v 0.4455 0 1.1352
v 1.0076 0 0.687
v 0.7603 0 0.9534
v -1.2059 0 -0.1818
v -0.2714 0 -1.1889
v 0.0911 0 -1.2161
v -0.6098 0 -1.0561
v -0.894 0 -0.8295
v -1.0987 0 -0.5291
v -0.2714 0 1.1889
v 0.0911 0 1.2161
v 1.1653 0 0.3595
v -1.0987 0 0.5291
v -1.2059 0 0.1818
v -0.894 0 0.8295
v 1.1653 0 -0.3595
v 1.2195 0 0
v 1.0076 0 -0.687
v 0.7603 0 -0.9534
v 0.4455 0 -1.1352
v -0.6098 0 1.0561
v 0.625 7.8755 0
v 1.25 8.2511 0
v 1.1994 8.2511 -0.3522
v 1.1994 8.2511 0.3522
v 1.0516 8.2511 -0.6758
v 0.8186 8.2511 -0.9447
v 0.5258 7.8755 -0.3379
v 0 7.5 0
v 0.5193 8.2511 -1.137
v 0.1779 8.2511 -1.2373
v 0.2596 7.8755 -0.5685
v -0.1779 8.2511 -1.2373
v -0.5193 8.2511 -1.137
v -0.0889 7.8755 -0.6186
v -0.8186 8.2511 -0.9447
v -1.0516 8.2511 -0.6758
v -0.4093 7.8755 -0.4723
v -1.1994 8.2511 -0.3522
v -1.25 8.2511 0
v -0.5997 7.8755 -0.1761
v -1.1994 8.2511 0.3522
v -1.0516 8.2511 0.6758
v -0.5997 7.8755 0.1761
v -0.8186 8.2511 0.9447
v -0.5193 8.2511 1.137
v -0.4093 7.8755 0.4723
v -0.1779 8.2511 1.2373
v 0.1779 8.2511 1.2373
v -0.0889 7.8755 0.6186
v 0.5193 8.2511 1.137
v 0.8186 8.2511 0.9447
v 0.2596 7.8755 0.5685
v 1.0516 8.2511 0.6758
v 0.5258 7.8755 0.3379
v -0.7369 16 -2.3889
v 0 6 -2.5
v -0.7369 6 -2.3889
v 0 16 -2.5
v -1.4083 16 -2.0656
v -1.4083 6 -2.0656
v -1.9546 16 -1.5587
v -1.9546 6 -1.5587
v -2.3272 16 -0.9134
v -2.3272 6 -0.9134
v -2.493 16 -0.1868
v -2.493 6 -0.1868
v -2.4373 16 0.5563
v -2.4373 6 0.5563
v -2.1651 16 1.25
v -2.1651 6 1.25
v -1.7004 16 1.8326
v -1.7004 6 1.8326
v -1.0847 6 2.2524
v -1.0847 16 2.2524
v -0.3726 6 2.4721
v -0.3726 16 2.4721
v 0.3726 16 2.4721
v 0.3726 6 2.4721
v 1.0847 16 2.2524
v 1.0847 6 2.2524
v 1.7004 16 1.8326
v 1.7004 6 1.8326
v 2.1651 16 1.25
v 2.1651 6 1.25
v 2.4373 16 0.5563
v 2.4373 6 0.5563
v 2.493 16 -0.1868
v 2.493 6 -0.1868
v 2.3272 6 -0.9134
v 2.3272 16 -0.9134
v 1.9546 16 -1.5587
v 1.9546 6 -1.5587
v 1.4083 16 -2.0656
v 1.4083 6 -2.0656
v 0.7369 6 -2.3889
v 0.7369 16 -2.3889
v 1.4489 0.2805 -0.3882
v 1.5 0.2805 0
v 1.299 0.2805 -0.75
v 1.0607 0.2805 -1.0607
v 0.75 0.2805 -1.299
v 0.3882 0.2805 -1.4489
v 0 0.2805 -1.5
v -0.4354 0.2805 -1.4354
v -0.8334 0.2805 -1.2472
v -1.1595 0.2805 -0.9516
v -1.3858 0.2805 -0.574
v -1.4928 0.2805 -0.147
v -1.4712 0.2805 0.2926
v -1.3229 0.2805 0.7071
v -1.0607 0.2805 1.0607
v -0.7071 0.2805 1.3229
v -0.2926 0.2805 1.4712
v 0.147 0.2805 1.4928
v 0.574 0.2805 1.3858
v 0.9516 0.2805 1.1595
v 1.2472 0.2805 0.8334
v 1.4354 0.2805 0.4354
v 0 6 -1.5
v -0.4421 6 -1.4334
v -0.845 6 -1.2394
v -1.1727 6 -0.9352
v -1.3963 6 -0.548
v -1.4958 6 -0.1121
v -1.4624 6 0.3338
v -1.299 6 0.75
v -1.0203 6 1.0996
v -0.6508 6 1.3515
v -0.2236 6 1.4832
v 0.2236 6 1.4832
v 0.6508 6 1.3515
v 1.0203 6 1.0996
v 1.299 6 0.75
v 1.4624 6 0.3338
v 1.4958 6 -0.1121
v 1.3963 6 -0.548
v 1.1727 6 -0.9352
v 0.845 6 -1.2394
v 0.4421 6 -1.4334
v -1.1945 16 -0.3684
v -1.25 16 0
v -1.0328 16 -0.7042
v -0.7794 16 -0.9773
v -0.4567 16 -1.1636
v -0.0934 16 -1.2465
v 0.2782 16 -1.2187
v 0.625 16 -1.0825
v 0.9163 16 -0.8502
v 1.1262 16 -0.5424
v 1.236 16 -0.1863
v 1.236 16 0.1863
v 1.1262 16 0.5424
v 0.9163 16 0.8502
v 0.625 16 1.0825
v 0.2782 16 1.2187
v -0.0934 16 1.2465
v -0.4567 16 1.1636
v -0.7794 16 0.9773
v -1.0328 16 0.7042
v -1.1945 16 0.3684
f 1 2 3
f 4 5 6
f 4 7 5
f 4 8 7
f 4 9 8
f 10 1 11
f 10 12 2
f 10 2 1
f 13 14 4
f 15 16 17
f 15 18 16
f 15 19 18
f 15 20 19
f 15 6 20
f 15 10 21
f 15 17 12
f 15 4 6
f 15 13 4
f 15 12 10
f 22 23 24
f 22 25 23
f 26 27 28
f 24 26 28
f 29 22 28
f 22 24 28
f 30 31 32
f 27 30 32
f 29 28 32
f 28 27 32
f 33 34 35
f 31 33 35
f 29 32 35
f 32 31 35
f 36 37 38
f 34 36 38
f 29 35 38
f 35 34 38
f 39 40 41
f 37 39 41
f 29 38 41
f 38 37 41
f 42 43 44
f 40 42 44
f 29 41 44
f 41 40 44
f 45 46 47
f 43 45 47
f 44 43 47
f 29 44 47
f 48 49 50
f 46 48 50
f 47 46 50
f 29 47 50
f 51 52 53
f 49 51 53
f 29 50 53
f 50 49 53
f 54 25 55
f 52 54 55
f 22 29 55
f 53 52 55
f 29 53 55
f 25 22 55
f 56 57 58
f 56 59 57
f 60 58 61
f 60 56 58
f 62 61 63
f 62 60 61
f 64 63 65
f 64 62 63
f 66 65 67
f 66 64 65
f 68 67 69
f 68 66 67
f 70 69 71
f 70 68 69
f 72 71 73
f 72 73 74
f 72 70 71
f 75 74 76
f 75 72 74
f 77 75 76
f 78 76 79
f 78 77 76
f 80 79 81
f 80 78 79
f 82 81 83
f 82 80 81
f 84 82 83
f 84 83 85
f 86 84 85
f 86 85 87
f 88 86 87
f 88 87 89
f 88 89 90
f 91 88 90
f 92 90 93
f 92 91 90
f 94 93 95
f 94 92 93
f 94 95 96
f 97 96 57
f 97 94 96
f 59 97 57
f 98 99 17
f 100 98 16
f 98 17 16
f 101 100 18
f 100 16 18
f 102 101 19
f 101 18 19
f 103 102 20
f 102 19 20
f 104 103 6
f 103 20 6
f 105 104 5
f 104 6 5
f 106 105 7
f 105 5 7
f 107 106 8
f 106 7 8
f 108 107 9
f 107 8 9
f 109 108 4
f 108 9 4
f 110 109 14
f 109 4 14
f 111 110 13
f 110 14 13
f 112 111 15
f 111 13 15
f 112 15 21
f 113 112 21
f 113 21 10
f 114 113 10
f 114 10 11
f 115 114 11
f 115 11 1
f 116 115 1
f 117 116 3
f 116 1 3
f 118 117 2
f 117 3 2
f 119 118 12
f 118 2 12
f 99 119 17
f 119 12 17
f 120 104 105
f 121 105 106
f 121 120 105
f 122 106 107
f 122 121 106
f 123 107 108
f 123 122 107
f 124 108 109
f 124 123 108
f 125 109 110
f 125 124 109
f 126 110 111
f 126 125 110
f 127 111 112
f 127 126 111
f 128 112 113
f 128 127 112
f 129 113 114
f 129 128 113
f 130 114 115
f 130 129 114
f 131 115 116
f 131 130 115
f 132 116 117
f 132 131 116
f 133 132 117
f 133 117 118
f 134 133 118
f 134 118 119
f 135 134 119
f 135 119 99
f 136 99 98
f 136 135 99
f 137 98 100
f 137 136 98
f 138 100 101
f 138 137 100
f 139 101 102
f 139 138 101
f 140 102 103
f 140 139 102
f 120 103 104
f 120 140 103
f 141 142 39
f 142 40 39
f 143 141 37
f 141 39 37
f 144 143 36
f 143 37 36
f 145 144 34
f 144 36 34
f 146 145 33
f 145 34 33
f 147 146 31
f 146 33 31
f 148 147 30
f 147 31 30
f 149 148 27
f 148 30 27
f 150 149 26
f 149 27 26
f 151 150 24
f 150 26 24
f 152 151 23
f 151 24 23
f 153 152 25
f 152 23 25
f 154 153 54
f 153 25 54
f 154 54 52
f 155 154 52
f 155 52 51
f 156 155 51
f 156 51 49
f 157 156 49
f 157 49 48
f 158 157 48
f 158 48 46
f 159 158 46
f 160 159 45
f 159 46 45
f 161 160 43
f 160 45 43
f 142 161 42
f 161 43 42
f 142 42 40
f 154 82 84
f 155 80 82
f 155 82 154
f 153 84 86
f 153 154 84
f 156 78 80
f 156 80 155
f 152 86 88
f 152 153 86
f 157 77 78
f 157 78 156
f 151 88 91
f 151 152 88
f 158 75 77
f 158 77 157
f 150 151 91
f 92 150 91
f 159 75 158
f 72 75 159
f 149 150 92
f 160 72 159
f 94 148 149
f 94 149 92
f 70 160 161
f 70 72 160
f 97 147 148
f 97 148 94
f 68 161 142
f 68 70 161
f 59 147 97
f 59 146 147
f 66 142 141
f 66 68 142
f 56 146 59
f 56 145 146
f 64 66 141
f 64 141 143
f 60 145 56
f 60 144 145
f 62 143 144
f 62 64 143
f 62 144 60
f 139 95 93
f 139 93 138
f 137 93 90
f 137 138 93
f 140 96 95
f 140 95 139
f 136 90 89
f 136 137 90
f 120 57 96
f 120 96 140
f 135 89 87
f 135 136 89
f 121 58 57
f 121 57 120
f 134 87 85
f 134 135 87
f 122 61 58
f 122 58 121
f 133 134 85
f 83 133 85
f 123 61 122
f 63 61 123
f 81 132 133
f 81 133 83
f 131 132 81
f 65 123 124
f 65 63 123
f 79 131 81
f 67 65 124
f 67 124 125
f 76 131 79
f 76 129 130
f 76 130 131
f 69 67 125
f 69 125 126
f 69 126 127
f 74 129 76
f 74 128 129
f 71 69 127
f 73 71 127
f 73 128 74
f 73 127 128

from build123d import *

# Parameters (mm, degrees)
M3_TAPPED_HOLE1_D     = 2.5
M3_TAPPED_HOLE1_DEPTH = 7.748924226
M3_TAPPED_HOLE1_TIP   = 0.751075774


# Read off the part's stored shape, not the designer's step: M3 Machine Threads Stud1
with BuildPart() as part:
    # Sketch2 → Revolve1 (revolve)
    with BuildSketch(Plane.XY, mode=Mode.PRIVATE) as revolve1_sk:
        Polygon((0, 0), (1.5, 0), (1.5, 6), (2.5, 6), (2.5, 16), (0, 16), align=None)
    revolve(revolve1_sk.sketch.rotate(Axis((0, 0, 0), (0, 1, 0)), 90), axis=Axis((0, 0, 0), (0, 1, 0)))

    # M3 Machine Threads Stud1 outline → M3 Machine Threads Stud1 (revolve, cut)
    with BuildSketch(Plane.XY):
        Polygon((1.5, 0.2805), (1.2195, 0), (1.5, 0), align=None)
    revolve(axis=Axis((0, 0, 0), (0, 1, 0)), mode=Mode.SUBTRACT)

    # M3 Tapped Hole1
    with Locations(Plane(origin=(0, 16, 0), x_dir=(1, 0, 0), z_dir=(0, 1, 0))):
        with Locations((0, 0)):
            Hole(M3_TAPPED_HOLE1_D / 2, depth=M3_TAPPED_HOLE1_DEPTH)
            with Locations((0, 0, -(M3_TAPPED_HOLE1_DEPTH + M3_TAPPED_HOLE1_TIP / 2))):  # 118° drill point
                Cone(0, M3_TAPPED_HOLE1_D / 2, M3_TAPPED_HOLE1_TIP, mode=Mode.SUBTRACT)


solid = part.part
